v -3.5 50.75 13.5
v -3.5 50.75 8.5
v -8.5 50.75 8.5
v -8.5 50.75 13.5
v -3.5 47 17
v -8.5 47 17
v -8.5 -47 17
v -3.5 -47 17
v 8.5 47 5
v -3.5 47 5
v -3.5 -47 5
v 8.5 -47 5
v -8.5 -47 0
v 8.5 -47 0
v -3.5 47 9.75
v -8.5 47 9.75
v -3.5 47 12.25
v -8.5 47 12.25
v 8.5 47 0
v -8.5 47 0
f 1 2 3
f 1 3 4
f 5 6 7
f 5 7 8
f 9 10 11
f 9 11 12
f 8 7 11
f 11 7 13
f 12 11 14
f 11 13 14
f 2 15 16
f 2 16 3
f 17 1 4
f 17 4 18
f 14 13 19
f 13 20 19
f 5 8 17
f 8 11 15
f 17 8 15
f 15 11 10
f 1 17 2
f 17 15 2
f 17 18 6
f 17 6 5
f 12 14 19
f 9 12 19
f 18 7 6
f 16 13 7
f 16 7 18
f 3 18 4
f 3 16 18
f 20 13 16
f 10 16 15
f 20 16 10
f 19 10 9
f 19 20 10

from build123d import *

# Parameters (mm, degrees)
F1_DEPTH = 5
F2_W     = 5
F2_H     = 94
F3_DEPTH = 12
F5_DEPTH = 5


with BuildPart() as f1:
    # F0 (on Top) → F1 (new body)
    with BuildSketch(Plane.XY):
        Polygon((-8.5, -47), (8.5, -47), (8.5, 47), (3.75, 47), (1.25, 47), (-8.5, 47), align=None)
    extrude(amount=F1_DEPTH)

    # F2 (on face) → F3 (join)
    with BuildSketch(Plane.XY.offset(5)):
        with Locations((-6, 0)):
            Rectangle(F2_W, F2_H)
    extrude(amount=F3_DEPTH)

    # F4 (on face) → F5 (join)
    with BuildSketch(Plane.YZ.offset(-3.5)):
        Polygon((50.75, 13.5), (47, 12.25), (47, 9.75), (50.75, 8.5), align=None)
    extrude(amount=-F5_DEPTH)


solid = f1.part
